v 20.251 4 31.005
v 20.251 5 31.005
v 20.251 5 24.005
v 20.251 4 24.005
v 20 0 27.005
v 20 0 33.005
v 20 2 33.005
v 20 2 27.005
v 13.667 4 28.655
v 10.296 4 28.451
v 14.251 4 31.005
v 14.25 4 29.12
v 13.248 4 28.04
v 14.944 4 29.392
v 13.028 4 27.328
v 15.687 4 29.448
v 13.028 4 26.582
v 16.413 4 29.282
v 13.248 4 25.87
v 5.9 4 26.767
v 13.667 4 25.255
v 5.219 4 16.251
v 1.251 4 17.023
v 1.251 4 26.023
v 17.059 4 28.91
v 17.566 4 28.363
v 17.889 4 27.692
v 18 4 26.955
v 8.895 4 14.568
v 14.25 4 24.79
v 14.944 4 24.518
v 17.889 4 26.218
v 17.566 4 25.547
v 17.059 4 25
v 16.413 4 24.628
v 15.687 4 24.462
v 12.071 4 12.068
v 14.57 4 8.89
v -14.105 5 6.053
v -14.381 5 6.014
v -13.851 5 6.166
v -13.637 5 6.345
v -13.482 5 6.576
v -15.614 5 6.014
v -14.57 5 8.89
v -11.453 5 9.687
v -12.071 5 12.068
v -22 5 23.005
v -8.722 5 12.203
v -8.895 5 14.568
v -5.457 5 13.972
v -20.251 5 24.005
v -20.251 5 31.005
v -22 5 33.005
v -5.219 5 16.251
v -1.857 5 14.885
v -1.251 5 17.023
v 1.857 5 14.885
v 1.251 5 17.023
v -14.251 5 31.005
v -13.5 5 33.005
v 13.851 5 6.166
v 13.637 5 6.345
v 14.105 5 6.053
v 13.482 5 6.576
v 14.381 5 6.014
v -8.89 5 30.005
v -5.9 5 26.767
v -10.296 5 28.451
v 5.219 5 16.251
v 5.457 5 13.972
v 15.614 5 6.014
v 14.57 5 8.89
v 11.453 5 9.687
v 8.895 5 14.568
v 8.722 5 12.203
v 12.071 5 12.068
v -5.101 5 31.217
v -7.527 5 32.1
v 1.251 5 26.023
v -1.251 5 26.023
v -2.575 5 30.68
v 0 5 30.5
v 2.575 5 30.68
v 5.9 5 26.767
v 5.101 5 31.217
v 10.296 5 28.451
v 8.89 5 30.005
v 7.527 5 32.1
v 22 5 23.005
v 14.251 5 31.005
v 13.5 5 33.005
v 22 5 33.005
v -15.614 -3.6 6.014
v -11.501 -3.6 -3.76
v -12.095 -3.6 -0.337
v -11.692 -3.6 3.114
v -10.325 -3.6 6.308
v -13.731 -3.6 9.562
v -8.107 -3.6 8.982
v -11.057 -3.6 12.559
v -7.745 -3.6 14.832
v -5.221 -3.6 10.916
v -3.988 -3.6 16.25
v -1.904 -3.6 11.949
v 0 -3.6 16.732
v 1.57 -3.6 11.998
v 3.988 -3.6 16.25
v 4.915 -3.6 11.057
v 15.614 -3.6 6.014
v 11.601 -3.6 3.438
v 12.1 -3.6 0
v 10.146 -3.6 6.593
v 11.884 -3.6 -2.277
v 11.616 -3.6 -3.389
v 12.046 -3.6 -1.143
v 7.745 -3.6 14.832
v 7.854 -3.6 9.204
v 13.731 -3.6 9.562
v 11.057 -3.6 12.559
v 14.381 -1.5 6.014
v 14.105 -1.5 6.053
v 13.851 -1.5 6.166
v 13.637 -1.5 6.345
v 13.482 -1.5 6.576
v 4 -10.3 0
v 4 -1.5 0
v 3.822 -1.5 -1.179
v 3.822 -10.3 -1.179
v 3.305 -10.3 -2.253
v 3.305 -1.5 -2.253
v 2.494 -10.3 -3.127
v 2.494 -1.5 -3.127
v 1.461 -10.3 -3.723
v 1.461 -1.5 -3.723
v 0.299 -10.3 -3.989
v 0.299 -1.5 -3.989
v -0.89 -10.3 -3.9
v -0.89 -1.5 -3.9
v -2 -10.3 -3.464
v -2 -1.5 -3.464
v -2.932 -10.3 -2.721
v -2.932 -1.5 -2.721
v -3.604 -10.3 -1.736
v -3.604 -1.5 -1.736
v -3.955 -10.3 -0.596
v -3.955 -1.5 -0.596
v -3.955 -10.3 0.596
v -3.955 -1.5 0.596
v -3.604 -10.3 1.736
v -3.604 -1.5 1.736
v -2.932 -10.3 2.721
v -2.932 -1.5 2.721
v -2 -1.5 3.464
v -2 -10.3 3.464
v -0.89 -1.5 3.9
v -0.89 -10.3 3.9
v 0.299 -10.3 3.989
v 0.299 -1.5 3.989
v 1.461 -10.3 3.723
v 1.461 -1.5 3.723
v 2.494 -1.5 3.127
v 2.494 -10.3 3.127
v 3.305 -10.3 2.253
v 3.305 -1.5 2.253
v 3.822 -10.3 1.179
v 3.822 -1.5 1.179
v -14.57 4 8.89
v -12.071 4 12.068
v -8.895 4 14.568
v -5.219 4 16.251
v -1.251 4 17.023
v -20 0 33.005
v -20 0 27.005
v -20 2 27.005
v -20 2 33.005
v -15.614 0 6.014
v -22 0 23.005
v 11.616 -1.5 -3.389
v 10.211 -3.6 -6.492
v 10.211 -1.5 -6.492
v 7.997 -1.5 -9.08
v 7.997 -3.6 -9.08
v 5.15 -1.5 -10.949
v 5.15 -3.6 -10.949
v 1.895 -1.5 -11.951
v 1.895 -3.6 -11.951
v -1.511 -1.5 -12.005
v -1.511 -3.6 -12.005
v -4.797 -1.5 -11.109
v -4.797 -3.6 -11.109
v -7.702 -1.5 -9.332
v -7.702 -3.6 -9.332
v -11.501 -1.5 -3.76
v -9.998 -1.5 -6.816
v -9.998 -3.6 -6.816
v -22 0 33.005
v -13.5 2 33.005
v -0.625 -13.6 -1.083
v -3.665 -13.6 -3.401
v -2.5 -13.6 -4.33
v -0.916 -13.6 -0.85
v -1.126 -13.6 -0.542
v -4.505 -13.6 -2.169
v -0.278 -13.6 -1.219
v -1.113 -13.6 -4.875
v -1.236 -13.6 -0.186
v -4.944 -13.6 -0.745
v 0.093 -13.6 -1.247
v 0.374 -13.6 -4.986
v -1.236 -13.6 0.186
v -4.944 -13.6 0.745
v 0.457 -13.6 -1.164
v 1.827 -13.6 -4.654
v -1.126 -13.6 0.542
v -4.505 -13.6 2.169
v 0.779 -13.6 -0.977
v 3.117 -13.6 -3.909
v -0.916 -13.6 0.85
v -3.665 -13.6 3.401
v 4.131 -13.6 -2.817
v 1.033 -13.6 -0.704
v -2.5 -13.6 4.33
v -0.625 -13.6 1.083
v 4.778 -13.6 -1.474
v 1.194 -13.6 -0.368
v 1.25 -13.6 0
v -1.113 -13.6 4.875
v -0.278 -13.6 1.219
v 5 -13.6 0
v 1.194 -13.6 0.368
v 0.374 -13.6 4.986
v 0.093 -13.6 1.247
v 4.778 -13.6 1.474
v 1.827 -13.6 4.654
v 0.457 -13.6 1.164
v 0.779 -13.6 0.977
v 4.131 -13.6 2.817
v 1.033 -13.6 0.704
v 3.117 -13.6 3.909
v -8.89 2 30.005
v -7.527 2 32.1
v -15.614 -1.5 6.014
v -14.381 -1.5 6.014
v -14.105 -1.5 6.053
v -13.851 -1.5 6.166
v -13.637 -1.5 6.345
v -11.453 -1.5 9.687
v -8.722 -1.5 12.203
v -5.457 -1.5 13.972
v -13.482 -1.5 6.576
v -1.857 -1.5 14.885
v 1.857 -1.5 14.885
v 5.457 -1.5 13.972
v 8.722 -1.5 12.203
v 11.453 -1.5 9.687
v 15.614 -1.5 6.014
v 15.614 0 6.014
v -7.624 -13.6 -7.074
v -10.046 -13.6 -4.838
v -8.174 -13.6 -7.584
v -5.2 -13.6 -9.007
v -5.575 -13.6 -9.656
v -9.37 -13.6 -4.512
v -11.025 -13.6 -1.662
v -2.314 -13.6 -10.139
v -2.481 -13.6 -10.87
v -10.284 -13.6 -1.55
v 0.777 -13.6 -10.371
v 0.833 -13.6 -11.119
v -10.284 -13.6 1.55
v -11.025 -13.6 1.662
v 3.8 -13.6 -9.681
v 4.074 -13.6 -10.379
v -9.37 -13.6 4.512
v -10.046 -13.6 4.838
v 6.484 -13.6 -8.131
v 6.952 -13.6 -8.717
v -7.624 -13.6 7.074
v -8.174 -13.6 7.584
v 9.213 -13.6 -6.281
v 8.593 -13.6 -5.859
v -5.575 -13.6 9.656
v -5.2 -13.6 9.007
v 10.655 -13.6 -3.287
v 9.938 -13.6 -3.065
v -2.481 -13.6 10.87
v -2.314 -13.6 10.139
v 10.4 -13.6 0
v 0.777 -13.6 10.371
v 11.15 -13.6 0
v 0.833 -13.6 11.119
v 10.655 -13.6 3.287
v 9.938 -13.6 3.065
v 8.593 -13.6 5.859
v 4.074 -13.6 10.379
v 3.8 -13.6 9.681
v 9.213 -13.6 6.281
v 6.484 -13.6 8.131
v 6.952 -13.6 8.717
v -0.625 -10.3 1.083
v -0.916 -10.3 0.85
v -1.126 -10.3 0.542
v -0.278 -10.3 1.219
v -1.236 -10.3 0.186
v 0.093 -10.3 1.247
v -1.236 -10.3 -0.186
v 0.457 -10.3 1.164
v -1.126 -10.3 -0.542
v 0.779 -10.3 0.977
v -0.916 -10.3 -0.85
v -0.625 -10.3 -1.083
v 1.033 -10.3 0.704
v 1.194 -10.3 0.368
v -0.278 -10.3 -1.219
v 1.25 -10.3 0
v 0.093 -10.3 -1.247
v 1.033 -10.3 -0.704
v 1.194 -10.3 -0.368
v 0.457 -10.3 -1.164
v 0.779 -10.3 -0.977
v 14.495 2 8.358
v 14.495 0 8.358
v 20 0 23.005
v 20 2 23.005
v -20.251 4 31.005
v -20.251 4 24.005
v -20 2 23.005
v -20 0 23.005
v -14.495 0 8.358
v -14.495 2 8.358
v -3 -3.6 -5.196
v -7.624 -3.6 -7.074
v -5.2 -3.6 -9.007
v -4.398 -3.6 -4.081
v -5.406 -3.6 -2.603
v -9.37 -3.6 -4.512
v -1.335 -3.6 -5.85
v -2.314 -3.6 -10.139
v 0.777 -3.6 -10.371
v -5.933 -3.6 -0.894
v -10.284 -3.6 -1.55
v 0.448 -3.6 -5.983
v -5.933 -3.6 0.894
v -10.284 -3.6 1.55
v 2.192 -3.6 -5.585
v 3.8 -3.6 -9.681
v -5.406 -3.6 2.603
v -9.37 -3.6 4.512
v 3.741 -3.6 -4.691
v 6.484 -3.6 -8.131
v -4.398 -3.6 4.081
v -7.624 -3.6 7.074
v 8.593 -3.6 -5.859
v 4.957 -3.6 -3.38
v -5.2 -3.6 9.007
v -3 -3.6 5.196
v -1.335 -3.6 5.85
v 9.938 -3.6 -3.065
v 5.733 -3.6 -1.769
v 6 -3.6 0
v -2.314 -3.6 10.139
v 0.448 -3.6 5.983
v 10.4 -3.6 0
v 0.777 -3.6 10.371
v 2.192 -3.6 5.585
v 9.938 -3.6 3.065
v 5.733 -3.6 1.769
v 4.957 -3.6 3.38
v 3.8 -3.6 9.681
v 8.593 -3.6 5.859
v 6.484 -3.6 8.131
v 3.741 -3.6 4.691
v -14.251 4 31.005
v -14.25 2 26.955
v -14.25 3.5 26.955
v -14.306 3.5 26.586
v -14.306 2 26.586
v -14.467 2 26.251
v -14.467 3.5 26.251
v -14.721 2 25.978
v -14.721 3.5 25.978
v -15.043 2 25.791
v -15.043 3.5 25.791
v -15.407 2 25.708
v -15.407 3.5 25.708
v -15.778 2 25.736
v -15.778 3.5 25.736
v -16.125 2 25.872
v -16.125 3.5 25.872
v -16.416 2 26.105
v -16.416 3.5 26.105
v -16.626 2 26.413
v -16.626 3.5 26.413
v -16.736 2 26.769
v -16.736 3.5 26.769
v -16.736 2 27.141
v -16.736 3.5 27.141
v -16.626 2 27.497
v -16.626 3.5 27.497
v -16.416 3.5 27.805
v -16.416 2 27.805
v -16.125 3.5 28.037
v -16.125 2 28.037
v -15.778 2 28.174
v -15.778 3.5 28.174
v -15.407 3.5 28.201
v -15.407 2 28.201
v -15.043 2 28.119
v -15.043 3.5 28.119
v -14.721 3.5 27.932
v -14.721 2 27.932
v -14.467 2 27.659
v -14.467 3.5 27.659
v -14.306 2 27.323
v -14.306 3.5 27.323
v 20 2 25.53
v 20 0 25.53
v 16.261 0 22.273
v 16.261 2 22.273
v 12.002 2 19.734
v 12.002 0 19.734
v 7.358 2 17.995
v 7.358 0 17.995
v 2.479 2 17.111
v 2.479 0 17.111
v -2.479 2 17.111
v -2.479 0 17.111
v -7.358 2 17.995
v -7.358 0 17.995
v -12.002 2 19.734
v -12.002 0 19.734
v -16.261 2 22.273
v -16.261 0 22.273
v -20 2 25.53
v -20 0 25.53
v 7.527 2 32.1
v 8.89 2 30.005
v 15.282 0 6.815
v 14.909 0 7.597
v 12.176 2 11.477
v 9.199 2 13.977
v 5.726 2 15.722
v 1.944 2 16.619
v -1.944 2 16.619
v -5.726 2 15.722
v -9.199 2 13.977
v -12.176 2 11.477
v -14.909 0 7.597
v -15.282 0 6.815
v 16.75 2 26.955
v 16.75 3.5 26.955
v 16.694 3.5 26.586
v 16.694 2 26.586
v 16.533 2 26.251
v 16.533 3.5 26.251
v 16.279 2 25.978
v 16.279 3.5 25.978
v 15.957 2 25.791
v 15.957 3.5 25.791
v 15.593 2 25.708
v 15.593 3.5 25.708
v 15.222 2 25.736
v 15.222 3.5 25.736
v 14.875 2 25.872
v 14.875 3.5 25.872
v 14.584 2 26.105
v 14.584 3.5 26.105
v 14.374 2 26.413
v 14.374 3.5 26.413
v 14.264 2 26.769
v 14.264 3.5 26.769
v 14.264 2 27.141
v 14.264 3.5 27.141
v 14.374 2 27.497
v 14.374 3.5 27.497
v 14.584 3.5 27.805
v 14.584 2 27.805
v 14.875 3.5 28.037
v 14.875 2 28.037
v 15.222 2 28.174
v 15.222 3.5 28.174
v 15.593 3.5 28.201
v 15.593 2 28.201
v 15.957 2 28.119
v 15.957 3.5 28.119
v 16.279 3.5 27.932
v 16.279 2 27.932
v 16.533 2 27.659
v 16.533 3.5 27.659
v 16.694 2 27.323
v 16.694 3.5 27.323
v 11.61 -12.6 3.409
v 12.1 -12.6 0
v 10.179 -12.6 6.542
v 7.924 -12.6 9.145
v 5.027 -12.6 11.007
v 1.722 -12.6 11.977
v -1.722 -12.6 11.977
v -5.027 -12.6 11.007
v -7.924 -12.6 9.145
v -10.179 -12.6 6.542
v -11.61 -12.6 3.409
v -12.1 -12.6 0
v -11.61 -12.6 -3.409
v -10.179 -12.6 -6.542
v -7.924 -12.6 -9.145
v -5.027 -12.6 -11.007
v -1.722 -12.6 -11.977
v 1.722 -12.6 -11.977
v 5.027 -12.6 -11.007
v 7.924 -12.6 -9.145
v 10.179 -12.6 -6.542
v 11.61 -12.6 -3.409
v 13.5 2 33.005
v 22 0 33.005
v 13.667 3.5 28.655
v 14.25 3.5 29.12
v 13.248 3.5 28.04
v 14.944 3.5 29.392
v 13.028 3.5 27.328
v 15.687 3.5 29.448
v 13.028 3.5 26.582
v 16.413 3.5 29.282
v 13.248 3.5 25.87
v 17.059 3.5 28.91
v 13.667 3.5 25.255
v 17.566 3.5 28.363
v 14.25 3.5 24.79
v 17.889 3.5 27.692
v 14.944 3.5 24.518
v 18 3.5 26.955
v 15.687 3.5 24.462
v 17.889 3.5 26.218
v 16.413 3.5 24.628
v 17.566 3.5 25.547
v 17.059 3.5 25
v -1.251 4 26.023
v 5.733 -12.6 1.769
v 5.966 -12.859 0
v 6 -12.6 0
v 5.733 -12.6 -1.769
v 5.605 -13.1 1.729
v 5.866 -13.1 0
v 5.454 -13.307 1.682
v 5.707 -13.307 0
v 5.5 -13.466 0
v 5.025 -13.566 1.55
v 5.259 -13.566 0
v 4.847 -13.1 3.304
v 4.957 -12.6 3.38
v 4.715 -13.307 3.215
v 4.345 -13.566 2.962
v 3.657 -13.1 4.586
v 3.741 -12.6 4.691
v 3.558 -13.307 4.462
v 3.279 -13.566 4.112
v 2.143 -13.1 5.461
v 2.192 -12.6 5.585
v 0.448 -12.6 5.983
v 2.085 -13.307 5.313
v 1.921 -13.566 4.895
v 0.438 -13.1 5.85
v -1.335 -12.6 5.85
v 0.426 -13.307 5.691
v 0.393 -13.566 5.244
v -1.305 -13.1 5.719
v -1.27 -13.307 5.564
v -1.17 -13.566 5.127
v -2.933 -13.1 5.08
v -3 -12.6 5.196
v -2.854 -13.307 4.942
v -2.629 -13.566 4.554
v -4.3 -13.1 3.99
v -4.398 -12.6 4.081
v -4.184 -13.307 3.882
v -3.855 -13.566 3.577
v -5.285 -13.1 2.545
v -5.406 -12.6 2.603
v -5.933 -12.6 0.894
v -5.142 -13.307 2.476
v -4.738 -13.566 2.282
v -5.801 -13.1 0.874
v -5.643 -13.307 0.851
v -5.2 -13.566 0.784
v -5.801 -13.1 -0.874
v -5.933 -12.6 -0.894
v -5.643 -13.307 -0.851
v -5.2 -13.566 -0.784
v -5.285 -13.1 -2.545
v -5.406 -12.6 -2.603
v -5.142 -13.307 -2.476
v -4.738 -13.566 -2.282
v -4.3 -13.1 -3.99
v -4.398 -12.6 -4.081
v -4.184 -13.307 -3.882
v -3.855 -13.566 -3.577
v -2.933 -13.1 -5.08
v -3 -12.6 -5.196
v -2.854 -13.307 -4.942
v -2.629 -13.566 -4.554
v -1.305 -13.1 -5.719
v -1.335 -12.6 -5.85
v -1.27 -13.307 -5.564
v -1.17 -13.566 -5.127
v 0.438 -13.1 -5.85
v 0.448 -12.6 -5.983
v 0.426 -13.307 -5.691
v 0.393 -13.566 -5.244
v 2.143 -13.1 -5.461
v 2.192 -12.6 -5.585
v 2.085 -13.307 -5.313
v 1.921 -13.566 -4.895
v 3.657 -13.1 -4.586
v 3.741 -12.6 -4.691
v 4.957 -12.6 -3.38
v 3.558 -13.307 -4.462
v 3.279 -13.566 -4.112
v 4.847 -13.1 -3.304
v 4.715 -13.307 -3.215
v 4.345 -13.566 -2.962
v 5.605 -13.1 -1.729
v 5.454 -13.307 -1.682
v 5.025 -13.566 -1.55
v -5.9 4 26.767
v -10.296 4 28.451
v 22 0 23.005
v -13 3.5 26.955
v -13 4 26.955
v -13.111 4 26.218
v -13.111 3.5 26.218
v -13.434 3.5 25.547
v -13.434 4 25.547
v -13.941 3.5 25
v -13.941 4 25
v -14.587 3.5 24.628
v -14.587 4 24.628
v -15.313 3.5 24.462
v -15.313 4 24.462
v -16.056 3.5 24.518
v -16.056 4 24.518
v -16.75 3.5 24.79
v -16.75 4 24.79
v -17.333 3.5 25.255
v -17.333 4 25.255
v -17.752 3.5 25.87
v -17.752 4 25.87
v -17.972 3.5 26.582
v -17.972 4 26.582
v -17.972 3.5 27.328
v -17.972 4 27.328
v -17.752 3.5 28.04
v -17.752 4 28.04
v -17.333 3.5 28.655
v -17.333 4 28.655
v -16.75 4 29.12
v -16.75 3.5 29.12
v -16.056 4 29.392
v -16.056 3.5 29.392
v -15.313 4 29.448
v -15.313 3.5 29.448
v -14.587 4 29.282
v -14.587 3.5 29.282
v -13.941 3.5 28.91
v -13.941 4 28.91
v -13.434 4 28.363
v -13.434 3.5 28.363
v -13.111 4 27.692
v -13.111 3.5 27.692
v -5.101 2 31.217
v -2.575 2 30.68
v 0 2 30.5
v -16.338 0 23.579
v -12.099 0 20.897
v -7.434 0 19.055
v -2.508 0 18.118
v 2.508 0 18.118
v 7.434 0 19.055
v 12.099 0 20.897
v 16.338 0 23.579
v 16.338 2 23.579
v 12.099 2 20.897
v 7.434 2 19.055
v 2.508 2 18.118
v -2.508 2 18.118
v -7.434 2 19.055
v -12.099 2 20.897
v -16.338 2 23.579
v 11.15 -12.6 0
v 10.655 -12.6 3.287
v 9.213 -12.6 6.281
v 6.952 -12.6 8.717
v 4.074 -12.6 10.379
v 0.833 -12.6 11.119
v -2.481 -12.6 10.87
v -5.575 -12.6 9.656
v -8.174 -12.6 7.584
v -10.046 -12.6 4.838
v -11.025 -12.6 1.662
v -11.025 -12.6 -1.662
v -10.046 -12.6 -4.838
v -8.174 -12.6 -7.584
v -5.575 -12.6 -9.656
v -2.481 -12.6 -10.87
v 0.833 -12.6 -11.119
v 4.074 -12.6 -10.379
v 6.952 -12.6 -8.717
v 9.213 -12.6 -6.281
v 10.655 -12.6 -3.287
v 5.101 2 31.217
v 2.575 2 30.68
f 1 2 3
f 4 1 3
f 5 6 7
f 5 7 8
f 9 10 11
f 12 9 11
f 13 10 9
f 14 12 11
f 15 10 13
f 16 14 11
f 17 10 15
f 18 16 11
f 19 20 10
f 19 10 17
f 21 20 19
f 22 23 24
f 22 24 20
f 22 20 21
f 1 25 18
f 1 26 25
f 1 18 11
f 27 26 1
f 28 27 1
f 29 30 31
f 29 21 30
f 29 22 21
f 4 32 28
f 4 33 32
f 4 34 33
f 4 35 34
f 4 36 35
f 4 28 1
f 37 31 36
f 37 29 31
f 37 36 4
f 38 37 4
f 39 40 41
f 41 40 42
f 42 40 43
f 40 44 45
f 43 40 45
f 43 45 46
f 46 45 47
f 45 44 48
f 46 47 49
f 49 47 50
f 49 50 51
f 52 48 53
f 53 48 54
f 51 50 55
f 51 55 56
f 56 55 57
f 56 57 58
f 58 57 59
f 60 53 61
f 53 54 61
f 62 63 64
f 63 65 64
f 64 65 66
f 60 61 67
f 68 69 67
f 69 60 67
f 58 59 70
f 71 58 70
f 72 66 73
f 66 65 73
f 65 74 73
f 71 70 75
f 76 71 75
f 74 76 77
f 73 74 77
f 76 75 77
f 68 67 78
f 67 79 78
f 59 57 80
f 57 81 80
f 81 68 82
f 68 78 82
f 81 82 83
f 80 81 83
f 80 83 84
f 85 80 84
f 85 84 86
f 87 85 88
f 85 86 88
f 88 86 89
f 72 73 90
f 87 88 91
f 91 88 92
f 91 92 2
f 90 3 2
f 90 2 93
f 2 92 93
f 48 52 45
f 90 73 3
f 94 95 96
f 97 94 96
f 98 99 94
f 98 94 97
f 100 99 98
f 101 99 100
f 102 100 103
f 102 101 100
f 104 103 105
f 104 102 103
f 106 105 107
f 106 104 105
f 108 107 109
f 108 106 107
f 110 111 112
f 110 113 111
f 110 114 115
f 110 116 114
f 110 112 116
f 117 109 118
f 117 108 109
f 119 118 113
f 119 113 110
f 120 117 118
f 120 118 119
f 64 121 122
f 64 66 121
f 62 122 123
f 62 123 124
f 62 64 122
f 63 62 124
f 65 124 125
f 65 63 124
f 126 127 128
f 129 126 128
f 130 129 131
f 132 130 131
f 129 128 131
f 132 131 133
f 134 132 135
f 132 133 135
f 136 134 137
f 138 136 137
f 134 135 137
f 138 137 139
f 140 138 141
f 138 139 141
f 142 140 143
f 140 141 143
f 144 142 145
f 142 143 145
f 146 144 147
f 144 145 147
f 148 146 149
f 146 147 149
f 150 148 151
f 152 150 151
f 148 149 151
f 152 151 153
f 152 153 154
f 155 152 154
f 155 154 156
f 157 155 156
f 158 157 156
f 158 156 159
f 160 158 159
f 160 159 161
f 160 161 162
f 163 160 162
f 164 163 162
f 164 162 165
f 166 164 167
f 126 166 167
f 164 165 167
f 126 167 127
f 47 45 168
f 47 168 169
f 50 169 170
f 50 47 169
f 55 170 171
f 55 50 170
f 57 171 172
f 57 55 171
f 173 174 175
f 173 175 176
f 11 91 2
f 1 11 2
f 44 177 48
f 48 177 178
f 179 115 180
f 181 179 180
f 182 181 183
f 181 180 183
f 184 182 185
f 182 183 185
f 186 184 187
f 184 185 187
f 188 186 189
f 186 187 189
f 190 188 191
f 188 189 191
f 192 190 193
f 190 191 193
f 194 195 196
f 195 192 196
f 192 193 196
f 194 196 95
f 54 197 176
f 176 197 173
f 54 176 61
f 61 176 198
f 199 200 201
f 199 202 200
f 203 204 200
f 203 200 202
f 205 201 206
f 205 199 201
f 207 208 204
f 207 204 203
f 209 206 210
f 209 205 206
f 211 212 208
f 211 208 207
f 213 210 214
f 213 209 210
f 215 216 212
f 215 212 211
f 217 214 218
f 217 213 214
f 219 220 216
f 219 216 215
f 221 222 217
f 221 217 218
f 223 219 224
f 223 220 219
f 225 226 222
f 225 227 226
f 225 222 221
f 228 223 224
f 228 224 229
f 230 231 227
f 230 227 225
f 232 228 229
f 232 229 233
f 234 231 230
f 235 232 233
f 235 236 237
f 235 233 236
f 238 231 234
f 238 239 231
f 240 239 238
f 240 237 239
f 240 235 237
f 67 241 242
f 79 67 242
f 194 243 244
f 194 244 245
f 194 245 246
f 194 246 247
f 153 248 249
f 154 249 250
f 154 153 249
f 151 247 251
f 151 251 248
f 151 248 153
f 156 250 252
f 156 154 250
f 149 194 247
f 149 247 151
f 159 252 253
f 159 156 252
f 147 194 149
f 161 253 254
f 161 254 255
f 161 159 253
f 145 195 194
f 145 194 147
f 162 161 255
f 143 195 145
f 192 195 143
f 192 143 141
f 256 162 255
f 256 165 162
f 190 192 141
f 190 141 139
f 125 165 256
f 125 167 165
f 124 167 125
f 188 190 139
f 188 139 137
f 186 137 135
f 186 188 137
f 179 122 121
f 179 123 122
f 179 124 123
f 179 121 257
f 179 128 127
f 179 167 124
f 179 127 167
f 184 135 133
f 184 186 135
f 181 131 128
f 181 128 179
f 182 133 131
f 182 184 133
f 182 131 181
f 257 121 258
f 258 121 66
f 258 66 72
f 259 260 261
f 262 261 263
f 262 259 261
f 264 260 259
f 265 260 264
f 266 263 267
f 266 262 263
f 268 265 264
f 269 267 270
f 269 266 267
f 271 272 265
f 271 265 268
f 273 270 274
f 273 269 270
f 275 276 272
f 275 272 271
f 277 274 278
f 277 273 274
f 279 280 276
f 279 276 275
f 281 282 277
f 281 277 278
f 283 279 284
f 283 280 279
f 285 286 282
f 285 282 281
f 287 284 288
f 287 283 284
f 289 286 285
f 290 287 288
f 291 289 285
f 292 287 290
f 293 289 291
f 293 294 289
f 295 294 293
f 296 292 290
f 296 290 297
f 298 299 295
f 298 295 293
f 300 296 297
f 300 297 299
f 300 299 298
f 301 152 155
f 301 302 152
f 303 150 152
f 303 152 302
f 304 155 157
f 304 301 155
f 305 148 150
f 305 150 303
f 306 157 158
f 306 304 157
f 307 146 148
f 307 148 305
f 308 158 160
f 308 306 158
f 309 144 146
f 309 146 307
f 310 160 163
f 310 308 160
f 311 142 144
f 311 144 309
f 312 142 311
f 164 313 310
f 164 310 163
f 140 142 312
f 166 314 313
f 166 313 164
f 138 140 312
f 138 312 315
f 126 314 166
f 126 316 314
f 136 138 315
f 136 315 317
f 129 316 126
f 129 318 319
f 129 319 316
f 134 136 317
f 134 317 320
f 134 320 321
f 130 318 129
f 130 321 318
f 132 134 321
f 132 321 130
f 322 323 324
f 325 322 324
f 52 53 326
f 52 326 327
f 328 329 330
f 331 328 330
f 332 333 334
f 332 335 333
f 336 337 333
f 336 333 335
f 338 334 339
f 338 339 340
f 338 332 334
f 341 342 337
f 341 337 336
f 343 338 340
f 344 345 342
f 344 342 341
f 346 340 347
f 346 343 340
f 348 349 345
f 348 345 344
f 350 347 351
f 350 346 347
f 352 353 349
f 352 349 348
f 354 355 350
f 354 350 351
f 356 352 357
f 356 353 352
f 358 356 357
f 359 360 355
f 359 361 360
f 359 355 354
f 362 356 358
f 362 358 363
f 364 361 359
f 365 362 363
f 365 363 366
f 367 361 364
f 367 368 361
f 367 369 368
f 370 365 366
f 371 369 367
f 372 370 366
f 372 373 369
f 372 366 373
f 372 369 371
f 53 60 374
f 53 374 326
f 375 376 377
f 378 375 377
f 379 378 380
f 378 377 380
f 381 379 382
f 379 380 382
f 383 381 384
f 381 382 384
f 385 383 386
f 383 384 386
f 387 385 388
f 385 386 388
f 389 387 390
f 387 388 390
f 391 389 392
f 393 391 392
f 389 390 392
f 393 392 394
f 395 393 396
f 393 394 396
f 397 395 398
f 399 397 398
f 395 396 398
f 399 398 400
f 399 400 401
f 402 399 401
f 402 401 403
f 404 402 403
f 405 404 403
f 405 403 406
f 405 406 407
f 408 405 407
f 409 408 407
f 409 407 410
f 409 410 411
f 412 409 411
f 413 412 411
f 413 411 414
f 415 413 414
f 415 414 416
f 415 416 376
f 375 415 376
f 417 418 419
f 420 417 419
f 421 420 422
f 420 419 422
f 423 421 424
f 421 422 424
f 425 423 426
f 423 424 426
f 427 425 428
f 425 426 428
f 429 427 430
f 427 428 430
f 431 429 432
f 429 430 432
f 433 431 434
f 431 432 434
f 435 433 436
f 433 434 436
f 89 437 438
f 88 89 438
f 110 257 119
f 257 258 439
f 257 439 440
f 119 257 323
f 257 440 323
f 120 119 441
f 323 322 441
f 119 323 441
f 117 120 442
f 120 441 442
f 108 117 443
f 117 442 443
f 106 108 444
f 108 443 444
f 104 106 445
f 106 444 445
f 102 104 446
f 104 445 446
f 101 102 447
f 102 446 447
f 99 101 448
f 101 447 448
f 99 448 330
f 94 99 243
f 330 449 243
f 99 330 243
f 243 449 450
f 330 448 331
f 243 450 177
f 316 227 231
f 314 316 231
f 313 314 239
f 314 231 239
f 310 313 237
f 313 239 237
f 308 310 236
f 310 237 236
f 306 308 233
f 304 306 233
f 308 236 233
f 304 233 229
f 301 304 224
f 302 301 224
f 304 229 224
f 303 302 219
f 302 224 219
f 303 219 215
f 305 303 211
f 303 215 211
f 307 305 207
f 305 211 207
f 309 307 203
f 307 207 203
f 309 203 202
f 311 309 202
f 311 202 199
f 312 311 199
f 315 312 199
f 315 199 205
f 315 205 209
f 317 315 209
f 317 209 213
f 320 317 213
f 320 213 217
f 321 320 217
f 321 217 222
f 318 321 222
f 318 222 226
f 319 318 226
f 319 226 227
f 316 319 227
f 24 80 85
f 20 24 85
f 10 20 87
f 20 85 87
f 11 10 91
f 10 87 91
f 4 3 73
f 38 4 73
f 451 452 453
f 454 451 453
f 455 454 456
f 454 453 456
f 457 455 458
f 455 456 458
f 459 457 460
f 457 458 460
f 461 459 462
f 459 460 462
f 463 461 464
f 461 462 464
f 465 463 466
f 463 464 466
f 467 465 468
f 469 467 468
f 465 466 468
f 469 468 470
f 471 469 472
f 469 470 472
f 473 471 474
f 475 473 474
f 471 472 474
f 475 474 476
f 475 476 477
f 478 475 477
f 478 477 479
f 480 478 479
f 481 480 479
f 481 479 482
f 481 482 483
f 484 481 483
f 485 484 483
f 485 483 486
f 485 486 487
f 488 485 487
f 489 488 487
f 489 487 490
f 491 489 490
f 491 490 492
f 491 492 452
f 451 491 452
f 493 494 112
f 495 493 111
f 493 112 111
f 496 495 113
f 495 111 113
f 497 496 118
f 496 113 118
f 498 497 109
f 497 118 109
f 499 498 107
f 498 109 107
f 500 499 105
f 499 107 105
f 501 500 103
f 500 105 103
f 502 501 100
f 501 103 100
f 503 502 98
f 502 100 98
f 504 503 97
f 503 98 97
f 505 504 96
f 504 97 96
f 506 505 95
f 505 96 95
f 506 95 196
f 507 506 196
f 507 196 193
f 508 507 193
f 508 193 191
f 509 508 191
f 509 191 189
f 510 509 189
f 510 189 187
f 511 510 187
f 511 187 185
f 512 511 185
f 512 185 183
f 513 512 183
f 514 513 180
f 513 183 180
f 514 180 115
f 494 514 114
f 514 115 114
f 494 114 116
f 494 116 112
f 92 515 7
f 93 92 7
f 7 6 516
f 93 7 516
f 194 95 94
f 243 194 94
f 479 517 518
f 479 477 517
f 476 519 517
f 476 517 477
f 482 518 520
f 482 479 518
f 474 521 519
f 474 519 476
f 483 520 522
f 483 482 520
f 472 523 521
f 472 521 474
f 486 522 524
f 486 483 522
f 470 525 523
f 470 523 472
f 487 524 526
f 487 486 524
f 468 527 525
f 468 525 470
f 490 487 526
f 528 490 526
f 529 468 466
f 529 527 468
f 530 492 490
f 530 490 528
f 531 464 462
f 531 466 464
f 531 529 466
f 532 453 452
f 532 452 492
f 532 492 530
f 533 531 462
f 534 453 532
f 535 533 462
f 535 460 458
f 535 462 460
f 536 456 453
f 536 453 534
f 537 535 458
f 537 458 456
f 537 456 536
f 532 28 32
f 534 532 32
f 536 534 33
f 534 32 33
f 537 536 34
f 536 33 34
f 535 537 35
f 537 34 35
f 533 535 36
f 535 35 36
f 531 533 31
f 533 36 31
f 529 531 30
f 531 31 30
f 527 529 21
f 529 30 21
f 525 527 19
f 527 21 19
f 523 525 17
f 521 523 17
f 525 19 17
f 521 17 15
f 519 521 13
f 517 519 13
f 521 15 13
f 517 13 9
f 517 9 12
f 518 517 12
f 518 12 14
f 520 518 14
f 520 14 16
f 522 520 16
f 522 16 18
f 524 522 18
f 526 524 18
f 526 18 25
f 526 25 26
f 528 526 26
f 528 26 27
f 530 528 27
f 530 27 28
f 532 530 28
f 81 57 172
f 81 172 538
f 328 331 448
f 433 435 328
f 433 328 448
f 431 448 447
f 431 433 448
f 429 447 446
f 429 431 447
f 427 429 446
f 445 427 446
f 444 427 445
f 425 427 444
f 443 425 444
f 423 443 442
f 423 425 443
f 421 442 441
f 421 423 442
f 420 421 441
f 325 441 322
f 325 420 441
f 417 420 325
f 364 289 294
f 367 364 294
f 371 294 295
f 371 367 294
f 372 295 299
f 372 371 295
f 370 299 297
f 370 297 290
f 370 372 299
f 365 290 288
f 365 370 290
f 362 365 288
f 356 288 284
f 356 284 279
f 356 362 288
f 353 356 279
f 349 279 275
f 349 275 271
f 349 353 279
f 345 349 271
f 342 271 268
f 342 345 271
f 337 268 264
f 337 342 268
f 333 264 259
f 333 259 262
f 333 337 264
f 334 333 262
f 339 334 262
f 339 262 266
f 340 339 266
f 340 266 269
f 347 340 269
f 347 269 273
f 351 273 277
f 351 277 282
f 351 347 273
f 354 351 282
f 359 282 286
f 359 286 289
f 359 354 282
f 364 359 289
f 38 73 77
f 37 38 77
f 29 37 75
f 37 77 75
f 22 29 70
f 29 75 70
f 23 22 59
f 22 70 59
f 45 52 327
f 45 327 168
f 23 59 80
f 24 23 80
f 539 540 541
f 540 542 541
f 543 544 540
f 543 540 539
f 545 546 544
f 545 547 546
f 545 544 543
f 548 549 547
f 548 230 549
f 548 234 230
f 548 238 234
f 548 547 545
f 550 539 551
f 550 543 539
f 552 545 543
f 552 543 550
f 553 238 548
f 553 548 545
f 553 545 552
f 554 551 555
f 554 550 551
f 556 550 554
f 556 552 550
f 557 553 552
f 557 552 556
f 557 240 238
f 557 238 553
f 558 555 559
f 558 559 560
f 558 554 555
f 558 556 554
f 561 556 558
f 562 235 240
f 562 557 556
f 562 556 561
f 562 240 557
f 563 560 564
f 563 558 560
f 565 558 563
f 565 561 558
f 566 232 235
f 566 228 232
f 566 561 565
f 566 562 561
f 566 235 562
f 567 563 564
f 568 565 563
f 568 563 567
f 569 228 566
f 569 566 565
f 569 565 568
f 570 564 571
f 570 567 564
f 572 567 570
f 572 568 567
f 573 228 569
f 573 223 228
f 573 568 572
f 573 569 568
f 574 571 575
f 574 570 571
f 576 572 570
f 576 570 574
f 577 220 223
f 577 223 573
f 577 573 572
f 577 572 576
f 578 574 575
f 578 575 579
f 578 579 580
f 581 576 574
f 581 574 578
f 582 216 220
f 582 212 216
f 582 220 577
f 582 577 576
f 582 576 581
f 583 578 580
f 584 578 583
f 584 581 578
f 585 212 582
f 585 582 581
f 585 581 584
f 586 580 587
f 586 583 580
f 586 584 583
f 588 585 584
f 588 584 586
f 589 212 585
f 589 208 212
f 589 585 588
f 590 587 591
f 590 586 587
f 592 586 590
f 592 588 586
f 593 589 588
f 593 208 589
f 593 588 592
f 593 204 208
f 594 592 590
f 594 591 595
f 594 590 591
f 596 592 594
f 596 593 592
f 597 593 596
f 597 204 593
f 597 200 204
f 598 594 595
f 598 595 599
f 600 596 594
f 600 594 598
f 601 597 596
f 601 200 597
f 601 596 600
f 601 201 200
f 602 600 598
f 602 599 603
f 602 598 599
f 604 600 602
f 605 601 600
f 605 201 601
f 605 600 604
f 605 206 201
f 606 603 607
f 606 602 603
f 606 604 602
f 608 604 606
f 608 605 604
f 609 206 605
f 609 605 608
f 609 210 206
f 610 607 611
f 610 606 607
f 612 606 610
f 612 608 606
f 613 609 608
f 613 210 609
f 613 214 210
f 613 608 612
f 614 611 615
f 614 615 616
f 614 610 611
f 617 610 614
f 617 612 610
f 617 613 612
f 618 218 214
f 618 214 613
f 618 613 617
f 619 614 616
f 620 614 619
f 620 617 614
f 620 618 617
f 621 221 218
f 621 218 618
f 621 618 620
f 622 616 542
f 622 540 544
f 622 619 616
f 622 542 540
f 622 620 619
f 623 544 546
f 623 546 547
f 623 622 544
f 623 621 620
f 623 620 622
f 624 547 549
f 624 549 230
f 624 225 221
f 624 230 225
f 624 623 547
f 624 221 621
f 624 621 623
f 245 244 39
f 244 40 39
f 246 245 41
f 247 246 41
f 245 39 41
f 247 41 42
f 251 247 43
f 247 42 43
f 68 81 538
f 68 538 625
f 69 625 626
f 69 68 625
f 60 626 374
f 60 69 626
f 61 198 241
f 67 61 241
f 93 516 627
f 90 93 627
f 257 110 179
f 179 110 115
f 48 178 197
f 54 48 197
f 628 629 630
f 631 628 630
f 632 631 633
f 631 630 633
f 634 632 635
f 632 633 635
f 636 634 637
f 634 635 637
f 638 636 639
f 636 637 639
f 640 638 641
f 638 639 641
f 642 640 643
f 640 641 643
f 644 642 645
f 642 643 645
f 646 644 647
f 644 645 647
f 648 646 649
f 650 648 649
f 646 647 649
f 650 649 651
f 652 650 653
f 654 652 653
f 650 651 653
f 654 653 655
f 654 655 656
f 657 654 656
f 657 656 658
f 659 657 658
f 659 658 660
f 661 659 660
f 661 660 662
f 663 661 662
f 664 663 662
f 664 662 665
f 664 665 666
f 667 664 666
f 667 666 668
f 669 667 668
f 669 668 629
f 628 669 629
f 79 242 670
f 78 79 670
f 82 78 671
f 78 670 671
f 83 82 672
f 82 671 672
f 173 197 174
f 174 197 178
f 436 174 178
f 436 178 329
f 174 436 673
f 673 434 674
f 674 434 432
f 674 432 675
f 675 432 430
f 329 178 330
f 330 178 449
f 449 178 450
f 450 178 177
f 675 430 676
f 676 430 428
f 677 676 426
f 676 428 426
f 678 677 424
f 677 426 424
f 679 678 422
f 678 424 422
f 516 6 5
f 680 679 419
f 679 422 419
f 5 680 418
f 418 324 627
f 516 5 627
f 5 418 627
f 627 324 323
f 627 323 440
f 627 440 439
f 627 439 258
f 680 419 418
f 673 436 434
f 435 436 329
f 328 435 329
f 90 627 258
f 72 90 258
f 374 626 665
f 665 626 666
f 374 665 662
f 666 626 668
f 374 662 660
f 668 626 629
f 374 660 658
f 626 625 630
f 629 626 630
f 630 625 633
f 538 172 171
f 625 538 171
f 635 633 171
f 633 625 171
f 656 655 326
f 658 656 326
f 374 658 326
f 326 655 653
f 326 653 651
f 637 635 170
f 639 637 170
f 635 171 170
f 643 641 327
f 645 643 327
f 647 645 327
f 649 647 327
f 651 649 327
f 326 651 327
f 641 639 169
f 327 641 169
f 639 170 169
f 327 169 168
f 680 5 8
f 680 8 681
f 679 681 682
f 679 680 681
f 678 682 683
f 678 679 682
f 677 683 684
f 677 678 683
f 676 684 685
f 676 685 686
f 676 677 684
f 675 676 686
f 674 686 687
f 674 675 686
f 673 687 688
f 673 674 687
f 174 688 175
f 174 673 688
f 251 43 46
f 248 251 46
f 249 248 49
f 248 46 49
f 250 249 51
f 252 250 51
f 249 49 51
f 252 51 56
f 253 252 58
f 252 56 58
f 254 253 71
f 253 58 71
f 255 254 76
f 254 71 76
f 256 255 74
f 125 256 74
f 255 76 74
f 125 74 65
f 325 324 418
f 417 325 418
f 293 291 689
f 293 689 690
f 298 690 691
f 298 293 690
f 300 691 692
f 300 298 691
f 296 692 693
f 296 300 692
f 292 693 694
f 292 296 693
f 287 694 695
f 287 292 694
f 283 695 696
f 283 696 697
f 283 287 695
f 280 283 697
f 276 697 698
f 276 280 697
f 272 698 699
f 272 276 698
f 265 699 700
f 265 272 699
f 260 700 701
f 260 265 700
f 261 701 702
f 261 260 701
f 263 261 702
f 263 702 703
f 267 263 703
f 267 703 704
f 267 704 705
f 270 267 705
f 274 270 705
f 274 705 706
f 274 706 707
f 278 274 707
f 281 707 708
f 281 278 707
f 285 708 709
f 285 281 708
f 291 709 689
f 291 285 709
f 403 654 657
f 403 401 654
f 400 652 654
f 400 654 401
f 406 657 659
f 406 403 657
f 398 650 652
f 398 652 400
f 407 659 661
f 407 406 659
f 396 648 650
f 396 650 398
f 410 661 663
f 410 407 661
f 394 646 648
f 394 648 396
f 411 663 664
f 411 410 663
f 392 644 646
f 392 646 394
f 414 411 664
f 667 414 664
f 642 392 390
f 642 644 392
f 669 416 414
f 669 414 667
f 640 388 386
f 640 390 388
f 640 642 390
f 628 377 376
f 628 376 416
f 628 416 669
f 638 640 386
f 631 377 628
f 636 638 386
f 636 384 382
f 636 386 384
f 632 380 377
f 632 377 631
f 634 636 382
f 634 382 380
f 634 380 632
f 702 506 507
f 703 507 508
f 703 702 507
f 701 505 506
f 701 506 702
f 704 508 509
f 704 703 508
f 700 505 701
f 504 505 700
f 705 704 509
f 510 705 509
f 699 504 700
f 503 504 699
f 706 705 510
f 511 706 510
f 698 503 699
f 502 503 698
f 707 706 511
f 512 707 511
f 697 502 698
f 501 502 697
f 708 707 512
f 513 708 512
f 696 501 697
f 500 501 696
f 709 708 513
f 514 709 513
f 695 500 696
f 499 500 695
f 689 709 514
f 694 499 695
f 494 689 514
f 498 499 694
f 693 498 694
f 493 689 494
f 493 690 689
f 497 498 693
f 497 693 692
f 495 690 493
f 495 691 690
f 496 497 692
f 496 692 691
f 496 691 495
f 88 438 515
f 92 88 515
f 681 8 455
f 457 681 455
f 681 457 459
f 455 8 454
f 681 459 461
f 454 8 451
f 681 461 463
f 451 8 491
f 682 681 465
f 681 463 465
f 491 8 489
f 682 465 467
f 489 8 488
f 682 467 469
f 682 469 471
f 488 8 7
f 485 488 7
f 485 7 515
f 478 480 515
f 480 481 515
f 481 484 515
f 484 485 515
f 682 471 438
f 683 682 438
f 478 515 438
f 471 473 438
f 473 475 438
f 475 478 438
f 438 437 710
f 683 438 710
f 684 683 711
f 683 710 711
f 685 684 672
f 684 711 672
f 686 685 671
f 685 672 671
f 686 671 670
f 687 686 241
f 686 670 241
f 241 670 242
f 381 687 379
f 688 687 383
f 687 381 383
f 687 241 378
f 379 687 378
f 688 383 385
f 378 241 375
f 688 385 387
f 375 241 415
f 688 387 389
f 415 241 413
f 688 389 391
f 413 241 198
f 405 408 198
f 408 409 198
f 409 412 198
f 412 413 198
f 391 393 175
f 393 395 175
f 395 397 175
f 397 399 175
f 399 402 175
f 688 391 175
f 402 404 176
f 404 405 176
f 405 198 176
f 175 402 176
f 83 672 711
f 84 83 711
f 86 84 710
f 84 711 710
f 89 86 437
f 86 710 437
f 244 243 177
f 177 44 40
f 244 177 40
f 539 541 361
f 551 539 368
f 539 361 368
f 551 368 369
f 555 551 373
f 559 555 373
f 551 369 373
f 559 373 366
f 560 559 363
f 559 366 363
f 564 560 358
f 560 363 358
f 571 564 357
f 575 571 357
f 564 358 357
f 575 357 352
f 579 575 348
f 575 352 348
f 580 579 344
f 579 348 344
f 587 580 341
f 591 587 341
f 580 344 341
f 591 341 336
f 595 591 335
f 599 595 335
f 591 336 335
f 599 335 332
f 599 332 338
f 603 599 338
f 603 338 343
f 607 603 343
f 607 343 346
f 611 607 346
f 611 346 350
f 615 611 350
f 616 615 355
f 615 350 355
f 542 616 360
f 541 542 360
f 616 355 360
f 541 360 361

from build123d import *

# Parameters (mm, degrees)
BOSS_EXTRUDE1_DEPTH = 5
CUT_EXTRUDE6_DEPTH  = 2
CUT_EXTRUDE7_DEPTH  = 2
SKETCH12_R          = 16.732442385
BOSS_EXTRUDE3_DEPTH = 8.6
SKETCH13_R          = 12.1
SKETCH13_R_2        = 10.4
BOSS_EXTRUDE4_DEPTH = 10
SKETCH14_R          = 6
BOSS_EXTRUDE5_DEPTH = 10
CUT_EXTRUDE10_DEPTH = 1
SKETCH7_R           = 1.25
CUT_EXTRUDE11_DEPTH = 19.6
SKETCH8_R           = 2.5
CUT_EXTRUDE12_DEPTH = 1.5
SKETCH3_R           = 15
CUT_EXTRUDE14_DEPTH = 6.5
CUT_EXTRUDE15_DEPTH = 6.5
SKETCH15_R          = 1.25
CUT_EXTRUDE16_DEPTH = 6.5
FILLET2_R           = 1
SKETCH20_R          = 12.503929781
SKETCH20_R_2        = 11.15
CUT_EXTRUDE17_DEPTH = 1
SKETCH21_R          = 4
CUT_EXTRUDE19_DEPTH = 8.8
FILLET10_R          = 1
CUT_EXTRUDE21_DEPTH = 9.6


with BuildPart() as part:
    # Sketch1 → Boss-Extrude1 (new body)
    with BuildSketch(Plane(origin=(0, 0, 0), x_dir=(1, 0, 0), z_dir=(0, 1, 0))):
        with BuildLine():
            Line((-22, -23.004932369), (-22, -33.004932369))
            Line((-22, -33.004932369), (-13.5, -33.004932369))
            Line((-13.5, -33.004932369), (-8.890227771, -30.004932369))
            Line((-8.890227771, -30.004932369), (-7.526591408, -32.100283382))
            ThreePointArc((-7.526591408, -32.100283382), (-3.847417482, -30.904492858), (0, -30.5))
            Line((0, -30.5), (0, 12.5))
            ThreePointArc((0, 12.5), (-7.116131574, 10.276705281), (-11.700861907, 4.397707428))
            Line((-11.700861907, 4.397707428), (-22, -23.004932369))
        make_face()
        with BuildLine():
            ThreePointArc((11.700861907, 4.397707428), (7.116131574, 10.276705281), (0, 12.5))
            Line((0, 12.5), (0, -30.5))
            ThreePointArc((0, -30.5), (3.847417482, -30.904492858), (7.526591408, -32.100283382))
            Line((7.526591408, -32.100283382), (8.890227771, -30.004932369))
            Line((8.890227771, -30.004932369), (13.5, -33.004932369))
            Line((13.5, -33.004932369), (22, -33.004932369))
            Line((22, -33.004932369), (22, -23.004932369))
            Line((22, -23.004932369), (11.700861907, 4.397707428))
        make_face()
    extrude(amount=BOSS_EXTRUDE1_DEPTH)

    # Sketch9 → Cut-Extrude6 (cut)
    with BuildSketch(Plane.XZ):
        with BuildLine():
            Line((20, 33.004932369), (20, 27.004932369))
            ThreePointArc((20, 27.004932369), (0, 18), (-20, 27.004932369))
            Line((-20, 27.004932369), (-20, 33.004932369))
            Line((-20, 33.004932369), (20, 33.004932369))
        make_face()
    extrude(amount=-CUT_EXTRUDE6_DEPTH, mode=Mode.SUBTRACT)

    # Sketch11 → Cut-Extrude7 (cut)
    with BuildSketch(Plane.XZ):
        with BuildLine():
            Line((-20, 23.004932369), (-10.073125454, -3.40723582))
            ThreePointArc((-10.073125454, -3.40723582), (0, -10.633772254), (10.073125454, -3.40723582))
            Line((10.073125454, -3.40723582), (20, 23.004932369))
            Line((20, 23.004932369), (20, 25.529642354))
            ThreePointArc((20, 25.529642354), (0, 17.000016389), (-20, 25.529642354))
            Line((-20, 25.529642354), (-20, 23.004932369))
        make_face()
    extrude(amount=-CUT_EXTRUDE7_DEPTH, mode=Mode.SUBTRACT)

    # Sketch12 → Boss-Extrude3 (add)
    with BuildSketch(Plane.XZ.offset(-5)):
        Circle(SKETCH12_R)
    extrude(amount=BOSS_EXTRUDE3_DEPTH)

    # Sketch13 → Boss-Extrude4 (add)
    with BuildSketch(Plane.XZ.offset(3.6)):
        Circle(SKETCH13_R)
        Circle(SKETCH13_R_2, mode=Mode.SUBTRACT)
    extrude(amount=BOSS_EXTRUDE4_DEPTH)

    # Sketch14 → Boss-Extrude5 (add)
    with BuildSketch(Plane.XZ.offset(3.6)):
        Circle(SKETCH14_R)
    extrude(amount=BOSS_EXTRUDE5_DEPTH)

    # Sketch6 → Cut-Extrude10 (cut)
    with BuildSketch(Plane(origin=(0, 5, 0), x_dir=(1, 0, 0), z_dir=(0, 1, 0))):
        with BuildLine():
            Line((-1.251136393, -17.022628361), (-1.251136393, -26.022628361))
            ThreePointArc((-1.251136393, -26.022628361), (-8.141618616, -27.494920638), (-14.251136393, -31.004932369))
            Line((-14.251136393, -31.004932369), (-20.251136393, -31.004932369))
            Line((-20.251136393, -31.004932369), (-20.251136393, -24.004932369))
            Line((-20.251136393, -24.004932369), (-14.570404486, -8.89036173))
            ThreePointArc((-14.570404486, -8.89036173), (-8.894589877, -14.567823774), (-1.251136393, -17.022628361))
        make_face()
        with BuildLine():
            Line((20.251136393, -24.004932369), (14.570404486, -8.89036173))
            ThreePointArc((14.570404486, -8.89036173), (8.894589877, -14.567823774), (1.251136393, -17.022628361))
            Line((1.251136393, -17.022628361), (1.251136393, -26.022628361))
            ThreePointArc((1.251136393, -26.022628361), (8.141618616, -27.494920638), (14.251136393, -31.004932369))
            Line((14.251136393, -31.004932369), (20.251136393, -31.004932369))
            Line((20.251136393, -31.004932369), (20.251136393, -24.004932369))
        make_face()
    extrude(amount=-CUT_EXTRUDE10_DEPTH, mode=Mode.SUBTRACT)

    # Sketch7 → Cut-Extrude11 (cut, through all)
    with BuildSketch(Plane(origin=(0, 5, 0), x_dir=(1, 0, 0), z_dir=(0, 1, 0))):
        with Locations((-15.5, -26.954932369)):
            Circle(SKETCH7_R)
        with Locations((15.5, -26.954932369)):
            Circle(SKETCH7_R)
    extrude(amount=-CUT_EXTRUDE11_DEPTH, mode=Mode.SUBTRACT)

    # Sketch8 → Cut-Extrude12 (cut)
    with BuildSketch(Plane(origin=(0, 5, 0), x_dir=(1, 0, 0), z_dir=(0, 1, 0))):
        with Locations((-15.5, -26.954932369)):
            Circle(SKETCH8_R)
        with Locations((15.5, -26.954932369)):
            Circle(SKETCH8_R)
    extrude(amount=-CUT_EXTRUDE12_DEPTH, mode=Mode.SUBTRACT)

    # Sketch3 → Cut-Extrude14 (cut)
    with BuildSketch(Plane(origin=(0, 5, 0), x_dir=(1, 0, 0), z_dir=(0, 1, 0))):
        Circle(SKETCH3_R)
    extrude(amount=-CUT_EXTRUDE14_DEPTH, mode=Mode.SUBTRACT)

    # Sketch19 → Cut-Extrude15 (cut)
    with BuildSketch(Plane(origin=(0, 5, 0), x_dir=(1, 0, 0), z_dir=(0, 1, 0))):
        with BuildLine():
            Line((-15.614173224, -6.014334769), (15.614173224, -6.014334769))
            ThreePointArc((15.614173224, -6.014334769), (0, 16.732442385), (-15.614173224, -6.014334769))
        make_face()
    extrude(amount=-CUT_EXTRUDE15_DEPTH, mode=Mode.SUBTRACT)

    # Sketch15 → Cut-Extrude16 (cut)
    with BuildSketch(Plane.XZ.offset(13.6)):
        Circle(SKETCH15_R)
    extrude(amount=-CUT_EXTRUDE16_DEPTH, mode=Mode.SUBTRACT)

    # Fillet2
    fillet2_edges = [part.edges().sort_by_distance(p)[0] for p in [
        (-6, -13.6, 0),
    ]]
    fillet(fillet2_edges, radius=FILLET2_R)

    # Sketch20 → Cut-Extrude17 (cut)
    with BuildSketch(Plane.XZ.offset(13.6)):
        Circle(SKETCH20_R)
        Circle(SKETCH20_R_2, mode=Mode.SUBTRACT)
    extrude(amount=-CUT_EXTRUDE17_DEPTH, mode=Mode.SUBTRACT)

    # Sketch21 → Cut-Extrude19 (cut)
    with BuildSketch(Plane(origin=(0, -1.5, 0), x_dir=(1, 0, 0), z_dir=(0, 1, 0))):
        Circle(SKETCH21_R)
    extrude(amount=-CUT_EXTRUDE19_DEPTH, mode=Mode.SUBTRACT)

    # Fillet10
    fillet10_edges = [part.edges().sort_by_distance(p)[0] for p in [
        (13.741461978, 1.75, 6.014334769),
        (-13.741461978, 1.75, 6.014334769),
    ]]
    fillet(fillet10_edges, radius=FILLET10_R)

    # Sketch22 → Cut-Extrude21 (cut, through all)
    with BuildSketch(Plane.XZ.offset(3.6)):
        with BuildLine():
            Line((15.614173224, 6.014334769), (11.615625162, -3.389284894))
            ThreePointArc((11.615625162, -3.389284894), (0.193858429, -12.098446963), (-11.501074122, -3.759693345))
            Line((-11.501074122, -3.759693345), (-15.614173224, 6.014334769))
            ThreePointArc((-15.614173224, 6.014334769), (0, -16.732442385), (15.614173224, 6.014334769))
        make_face()
    extrude(amount=-CUT_EXTRUDE21_DEPTH, mode=Mode.SUBTRACT)


solid = part.part
